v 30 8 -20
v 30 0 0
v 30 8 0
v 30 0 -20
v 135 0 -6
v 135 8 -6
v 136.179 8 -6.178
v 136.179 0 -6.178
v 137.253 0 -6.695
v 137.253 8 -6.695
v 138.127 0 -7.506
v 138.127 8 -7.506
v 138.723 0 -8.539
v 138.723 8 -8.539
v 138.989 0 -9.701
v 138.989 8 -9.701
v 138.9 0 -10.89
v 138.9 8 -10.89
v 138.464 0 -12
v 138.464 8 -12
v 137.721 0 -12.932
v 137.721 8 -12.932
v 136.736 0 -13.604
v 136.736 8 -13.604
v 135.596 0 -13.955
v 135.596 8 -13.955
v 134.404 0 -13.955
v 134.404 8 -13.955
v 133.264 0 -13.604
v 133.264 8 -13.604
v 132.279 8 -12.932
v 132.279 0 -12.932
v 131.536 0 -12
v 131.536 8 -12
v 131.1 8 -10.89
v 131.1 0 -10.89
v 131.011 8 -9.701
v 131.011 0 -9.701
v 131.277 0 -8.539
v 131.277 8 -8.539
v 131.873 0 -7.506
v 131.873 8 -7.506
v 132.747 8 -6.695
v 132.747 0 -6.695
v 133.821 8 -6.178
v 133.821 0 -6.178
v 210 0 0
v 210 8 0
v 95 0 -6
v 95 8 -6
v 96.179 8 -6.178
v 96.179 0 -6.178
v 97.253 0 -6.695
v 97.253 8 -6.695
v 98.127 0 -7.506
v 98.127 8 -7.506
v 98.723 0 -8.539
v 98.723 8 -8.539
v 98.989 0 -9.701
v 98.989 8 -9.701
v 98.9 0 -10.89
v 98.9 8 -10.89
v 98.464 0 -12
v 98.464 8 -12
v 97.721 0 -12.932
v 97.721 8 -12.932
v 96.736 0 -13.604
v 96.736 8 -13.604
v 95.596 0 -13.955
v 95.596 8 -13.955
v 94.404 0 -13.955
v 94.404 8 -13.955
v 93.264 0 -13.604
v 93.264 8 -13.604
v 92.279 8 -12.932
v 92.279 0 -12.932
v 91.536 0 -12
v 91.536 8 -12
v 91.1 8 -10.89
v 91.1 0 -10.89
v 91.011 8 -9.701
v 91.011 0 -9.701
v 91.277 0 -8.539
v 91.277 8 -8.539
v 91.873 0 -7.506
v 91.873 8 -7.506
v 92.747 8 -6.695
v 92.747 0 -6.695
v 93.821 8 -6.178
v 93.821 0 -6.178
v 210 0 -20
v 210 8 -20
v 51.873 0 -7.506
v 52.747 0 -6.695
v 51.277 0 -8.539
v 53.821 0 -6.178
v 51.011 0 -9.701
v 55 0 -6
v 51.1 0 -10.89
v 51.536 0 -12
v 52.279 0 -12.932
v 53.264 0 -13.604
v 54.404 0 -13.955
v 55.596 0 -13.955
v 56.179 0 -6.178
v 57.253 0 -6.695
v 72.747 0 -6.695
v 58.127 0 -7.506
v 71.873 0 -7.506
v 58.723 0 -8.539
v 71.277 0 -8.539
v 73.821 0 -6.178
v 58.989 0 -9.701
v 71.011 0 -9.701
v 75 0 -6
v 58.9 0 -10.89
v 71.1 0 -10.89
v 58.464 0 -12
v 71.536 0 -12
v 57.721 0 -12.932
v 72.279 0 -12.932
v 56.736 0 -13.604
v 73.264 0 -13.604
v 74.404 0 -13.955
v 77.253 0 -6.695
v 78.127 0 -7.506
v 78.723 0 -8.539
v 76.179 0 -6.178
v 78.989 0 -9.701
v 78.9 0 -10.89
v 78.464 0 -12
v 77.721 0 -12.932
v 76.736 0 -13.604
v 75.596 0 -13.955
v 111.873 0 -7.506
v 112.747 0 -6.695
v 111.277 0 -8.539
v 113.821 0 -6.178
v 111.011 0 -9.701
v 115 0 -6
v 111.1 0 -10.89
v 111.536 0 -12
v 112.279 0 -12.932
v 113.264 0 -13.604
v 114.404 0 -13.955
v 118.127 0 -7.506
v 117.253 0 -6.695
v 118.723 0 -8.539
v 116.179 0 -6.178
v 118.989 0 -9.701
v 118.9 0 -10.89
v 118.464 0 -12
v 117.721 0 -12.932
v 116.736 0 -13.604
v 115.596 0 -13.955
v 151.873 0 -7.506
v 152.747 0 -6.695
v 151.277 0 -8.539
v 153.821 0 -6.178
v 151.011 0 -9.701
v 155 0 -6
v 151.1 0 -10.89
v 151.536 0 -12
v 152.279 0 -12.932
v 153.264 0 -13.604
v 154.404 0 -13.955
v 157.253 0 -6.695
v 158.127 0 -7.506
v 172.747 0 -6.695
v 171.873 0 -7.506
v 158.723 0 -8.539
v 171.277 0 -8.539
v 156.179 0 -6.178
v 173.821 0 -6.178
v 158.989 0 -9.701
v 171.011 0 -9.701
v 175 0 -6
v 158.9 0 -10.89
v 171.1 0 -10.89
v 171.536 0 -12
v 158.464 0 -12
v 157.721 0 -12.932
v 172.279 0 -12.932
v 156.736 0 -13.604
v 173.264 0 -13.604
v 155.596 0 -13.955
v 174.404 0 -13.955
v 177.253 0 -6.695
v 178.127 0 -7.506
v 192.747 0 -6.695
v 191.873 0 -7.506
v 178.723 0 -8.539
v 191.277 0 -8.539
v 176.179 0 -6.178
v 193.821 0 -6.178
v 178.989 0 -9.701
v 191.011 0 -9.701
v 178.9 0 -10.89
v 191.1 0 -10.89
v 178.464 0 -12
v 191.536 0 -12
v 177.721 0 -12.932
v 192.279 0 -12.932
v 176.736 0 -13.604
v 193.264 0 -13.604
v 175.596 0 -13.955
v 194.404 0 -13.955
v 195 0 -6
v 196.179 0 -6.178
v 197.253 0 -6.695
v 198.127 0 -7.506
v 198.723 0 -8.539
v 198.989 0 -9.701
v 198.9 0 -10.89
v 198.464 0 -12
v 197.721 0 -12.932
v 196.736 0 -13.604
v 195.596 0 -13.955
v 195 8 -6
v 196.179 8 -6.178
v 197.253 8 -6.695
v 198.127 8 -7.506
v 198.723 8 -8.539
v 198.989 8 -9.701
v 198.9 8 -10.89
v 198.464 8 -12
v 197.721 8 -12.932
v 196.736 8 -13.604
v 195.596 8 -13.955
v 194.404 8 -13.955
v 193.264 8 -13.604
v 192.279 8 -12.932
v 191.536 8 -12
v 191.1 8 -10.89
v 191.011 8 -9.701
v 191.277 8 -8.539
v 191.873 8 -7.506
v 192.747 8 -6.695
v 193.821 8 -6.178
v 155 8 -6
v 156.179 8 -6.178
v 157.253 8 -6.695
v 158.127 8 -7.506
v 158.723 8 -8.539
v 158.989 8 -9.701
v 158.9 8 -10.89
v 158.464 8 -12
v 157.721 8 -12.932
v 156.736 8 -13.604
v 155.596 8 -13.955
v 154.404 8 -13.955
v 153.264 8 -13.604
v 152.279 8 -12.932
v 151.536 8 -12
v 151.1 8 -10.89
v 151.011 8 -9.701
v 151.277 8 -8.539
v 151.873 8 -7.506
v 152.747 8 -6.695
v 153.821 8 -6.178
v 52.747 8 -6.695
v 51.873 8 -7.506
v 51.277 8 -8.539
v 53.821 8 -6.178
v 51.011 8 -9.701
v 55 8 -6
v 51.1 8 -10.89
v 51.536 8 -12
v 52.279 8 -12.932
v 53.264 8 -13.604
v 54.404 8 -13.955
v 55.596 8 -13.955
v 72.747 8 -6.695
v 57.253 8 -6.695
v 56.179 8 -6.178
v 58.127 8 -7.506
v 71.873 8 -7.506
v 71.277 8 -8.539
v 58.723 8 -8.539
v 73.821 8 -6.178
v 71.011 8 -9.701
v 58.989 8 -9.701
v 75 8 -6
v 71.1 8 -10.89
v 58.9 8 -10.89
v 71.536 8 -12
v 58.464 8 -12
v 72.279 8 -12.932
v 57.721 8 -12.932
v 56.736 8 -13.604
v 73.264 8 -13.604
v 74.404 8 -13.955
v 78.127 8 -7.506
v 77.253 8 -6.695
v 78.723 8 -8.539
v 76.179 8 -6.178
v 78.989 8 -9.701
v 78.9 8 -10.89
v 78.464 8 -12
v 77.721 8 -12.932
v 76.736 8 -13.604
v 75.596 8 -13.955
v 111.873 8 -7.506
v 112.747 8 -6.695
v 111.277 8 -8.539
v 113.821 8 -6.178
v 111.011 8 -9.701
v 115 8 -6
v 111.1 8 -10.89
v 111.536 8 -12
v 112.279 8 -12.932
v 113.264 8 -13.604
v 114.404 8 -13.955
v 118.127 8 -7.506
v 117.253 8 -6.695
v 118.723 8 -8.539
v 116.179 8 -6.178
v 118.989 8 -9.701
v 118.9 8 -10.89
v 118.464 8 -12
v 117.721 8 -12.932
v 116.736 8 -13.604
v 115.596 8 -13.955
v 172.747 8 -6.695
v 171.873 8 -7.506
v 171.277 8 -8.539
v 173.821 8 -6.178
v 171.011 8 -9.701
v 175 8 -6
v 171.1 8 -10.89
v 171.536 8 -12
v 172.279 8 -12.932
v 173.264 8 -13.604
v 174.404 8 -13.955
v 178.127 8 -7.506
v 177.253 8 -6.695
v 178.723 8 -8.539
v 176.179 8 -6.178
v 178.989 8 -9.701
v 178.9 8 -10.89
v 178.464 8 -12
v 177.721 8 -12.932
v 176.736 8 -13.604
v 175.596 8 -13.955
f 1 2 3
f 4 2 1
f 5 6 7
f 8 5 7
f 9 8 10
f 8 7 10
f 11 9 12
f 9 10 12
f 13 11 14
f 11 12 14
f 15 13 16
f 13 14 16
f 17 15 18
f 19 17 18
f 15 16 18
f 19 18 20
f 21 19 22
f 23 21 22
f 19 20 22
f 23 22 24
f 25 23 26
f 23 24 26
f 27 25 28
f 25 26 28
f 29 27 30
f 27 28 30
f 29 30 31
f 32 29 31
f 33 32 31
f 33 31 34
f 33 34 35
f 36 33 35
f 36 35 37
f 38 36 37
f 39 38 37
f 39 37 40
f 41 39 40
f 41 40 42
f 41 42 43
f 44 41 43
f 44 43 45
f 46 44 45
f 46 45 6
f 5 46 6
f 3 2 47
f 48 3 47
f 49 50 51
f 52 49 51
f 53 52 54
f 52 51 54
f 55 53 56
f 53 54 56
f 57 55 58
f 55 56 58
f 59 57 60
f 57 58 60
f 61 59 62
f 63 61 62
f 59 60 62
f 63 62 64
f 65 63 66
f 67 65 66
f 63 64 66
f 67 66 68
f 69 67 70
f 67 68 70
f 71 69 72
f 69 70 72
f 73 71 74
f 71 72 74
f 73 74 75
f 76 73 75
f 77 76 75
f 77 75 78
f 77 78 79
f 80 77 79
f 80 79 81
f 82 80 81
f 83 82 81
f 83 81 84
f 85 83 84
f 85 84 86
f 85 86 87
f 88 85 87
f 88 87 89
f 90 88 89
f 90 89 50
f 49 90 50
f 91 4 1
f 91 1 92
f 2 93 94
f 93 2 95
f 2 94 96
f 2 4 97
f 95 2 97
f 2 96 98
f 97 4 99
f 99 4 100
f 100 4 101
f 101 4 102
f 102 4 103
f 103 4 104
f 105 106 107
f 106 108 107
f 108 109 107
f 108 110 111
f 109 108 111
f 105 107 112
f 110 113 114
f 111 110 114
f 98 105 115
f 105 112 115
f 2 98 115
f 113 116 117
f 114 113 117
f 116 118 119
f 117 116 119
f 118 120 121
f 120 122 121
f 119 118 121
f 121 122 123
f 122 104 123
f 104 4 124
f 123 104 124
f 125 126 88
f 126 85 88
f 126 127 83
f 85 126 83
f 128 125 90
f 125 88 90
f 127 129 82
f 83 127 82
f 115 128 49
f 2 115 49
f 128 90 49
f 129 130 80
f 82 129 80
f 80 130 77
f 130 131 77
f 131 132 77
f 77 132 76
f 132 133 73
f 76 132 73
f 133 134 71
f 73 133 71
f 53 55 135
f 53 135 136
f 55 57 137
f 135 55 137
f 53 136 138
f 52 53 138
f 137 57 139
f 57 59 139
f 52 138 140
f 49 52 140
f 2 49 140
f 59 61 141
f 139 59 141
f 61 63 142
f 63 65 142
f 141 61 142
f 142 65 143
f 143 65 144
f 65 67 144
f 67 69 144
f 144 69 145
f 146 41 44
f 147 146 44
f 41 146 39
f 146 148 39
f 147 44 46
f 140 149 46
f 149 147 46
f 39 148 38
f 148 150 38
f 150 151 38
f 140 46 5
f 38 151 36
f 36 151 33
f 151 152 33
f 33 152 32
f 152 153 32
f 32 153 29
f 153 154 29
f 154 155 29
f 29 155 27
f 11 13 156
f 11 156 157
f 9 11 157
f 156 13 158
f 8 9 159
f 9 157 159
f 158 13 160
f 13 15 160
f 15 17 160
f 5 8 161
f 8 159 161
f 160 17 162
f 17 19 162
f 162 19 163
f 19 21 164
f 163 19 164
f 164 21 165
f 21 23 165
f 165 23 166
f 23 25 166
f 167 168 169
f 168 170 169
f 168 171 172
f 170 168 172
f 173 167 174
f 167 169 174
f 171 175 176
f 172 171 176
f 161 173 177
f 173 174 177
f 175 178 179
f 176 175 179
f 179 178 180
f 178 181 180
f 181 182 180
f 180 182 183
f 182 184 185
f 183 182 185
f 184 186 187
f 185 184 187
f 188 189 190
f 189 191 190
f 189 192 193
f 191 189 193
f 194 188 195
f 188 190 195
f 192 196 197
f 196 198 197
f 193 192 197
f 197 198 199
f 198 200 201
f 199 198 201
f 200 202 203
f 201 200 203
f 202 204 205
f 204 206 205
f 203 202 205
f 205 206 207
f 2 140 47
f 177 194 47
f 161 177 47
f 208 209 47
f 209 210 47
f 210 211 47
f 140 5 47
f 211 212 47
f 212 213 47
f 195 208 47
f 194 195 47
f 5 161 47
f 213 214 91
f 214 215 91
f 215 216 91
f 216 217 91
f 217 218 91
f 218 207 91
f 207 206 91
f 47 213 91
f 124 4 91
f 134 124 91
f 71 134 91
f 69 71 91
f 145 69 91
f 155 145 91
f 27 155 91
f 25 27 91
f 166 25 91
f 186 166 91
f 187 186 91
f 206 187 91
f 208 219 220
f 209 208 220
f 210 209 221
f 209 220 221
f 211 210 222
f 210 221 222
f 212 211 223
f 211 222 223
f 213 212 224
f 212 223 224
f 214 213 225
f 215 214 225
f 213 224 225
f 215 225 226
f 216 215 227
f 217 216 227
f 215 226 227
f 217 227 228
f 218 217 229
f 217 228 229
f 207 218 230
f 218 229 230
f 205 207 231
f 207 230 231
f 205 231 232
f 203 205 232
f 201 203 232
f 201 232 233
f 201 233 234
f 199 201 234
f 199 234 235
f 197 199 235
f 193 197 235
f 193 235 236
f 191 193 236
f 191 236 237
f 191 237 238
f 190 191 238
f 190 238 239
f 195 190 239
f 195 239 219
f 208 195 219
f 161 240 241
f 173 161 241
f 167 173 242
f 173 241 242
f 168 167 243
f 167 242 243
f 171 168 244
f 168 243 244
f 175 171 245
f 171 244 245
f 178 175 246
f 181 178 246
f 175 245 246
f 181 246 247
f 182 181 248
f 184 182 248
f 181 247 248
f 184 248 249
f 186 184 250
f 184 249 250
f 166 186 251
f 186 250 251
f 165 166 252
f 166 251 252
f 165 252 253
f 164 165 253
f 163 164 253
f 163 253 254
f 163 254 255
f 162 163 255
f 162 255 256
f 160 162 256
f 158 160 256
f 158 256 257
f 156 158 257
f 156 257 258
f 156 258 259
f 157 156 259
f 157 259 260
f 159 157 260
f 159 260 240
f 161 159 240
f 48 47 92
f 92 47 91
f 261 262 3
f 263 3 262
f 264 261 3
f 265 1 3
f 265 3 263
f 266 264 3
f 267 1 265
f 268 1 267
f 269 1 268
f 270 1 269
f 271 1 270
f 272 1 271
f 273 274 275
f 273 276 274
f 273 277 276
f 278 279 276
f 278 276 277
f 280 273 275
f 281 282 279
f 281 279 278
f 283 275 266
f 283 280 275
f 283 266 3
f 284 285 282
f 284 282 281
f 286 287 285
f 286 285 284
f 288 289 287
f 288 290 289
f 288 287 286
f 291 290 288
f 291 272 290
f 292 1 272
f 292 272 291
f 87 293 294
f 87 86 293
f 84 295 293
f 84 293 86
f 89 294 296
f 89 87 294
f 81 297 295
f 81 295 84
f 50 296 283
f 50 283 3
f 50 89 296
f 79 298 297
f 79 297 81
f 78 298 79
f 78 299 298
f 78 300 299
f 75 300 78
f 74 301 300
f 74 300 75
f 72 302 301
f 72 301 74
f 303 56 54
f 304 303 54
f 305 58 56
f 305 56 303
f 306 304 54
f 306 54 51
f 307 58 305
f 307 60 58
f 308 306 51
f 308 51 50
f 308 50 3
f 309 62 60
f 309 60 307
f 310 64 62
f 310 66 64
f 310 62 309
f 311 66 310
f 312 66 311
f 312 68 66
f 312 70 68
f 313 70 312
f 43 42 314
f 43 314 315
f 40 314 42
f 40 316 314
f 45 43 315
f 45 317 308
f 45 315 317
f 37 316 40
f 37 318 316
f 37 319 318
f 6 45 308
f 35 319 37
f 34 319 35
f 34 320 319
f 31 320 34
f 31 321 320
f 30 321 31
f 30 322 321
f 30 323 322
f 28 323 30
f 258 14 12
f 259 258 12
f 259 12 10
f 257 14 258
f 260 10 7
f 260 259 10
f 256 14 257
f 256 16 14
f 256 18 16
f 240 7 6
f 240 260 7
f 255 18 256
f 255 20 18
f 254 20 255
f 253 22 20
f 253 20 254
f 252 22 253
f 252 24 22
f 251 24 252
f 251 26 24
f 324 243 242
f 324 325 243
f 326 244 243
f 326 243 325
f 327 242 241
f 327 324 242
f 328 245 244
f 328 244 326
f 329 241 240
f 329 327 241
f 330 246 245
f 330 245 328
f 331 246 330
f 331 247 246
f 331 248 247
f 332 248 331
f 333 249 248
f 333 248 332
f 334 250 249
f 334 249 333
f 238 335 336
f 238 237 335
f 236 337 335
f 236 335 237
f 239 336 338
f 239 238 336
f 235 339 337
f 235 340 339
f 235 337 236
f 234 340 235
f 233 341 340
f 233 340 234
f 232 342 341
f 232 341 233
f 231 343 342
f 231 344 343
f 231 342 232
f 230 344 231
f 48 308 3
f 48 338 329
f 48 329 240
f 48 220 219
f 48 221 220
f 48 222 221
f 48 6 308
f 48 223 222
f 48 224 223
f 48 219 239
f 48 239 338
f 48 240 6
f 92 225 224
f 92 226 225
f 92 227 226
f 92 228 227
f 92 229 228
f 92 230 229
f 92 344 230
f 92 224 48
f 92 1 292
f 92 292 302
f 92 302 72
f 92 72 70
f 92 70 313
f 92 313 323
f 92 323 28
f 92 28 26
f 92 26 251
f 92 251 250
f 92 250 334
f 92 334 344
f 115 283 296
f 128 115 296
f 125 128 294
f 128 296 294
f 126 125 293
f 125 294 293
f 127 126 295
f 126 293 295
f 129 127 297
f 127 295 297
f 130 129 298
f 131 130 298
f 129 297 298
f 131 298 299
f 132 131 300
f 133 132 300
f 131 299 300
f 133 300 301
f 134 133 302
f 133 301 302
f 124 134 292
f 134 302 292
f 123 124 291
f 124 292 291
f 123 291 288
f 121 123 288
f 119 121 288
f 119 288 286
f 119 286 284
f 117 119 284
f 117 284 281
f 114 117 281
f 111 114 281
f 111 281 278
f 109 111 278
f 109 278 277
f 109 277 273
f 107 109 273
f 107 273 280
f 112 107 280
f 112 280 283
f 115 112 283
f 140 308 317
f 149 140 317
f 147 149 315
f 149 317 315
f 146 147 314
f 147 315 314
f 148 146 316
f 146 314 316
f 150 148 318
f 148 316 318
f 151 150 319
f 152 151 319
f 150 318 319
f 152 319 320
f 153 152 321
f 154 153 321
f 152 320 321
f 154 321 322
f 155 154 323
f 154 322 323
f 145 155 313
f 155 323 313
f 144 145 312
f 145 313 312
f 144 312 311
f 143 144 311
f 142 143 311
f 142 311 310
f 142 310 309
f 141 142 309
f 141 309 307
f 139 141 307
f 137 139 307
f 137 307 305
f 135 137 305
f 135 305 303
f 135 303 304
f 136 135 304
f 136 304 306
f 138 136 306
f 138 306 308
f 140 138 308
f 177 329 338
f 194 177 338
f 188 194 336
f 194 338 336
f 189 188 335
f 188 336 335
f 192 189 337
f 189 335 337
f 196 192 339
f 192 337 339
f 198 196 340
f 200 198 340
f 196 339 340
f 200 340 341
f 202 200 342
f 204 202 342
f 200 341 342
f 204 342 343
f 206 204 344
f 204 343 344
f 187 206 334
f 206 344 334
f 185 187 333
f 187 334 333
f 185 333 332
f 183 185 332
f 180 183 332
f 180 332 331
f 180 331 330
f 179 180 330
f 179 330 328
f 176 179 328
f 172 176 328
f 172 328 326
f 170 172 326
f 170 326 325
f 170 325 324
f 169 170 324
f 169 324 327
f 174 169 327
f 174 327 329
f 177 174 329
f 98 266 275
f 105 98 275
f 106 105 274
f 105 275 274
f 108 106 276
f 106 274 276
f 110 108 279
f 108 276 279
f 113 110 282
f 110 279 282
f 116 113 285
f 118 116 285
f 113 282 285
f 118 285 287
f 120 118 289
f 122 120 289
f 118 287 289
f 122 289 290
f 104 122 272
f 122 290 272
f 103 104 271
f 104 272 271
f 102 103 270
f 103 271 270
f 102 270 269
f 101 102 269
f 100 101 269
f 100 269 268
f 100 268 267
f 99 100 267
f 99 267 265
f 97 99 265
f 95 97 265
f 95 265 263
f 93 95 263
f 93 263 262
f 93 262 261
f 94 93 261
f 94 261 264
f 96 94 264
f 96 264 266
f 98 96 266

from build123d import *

# Parameters (mm, degrees)
SKETCH1_W           = 210
SKETCH1_H           = 20
BOSS_EXTRUDE1_DEPTH = 8
SKETCH2_R           = 4
CUT_EXTRUDE1_DEPTH  = 10
LPATTERN1_COUNT     = 8
LPATTERN1_PITCH     = 20
SKETCH4_W           = 80
SKETCH4_H           = 20
CUT_EXTRUDE2_DEPTH  = 10


with BuildPart() as part:
    # Sketch1 → Boss-Extrude1 (new body)
    with BuildSketch(Plane(origin=(0, 0, 0), x_dir=(1, 0, 0), z_dir=(0, 1, 0))):
        with Locations((105, 10)):
            Rectangle(SKETCH1_W, SKETCH1_H)
    extrude(amount=BOSS_EXTRUDE1_DEPTH)

    # Sketch2 → Cut-Extrude1 (cut)
    with BuildSketch(Plane(origin=(0, 8, 0), x_dir=(1, 0, 0), z_dir=(0, 1, 0))):
        with Locations(Location((195, 10, 0), (0, 0, 270))):
            Circle(SKETCH2_R)
    cut_extrude1 = extrude(amount=-CUT_EXTRUDE1_DEPTH, mode=Mode.SUBTRACT)

    # LPattern1: Cut-Extrude1 ×8
    with Locations(*[(-i * LPATTERN1_PITCH, 0, 0) for i in range(1, LPATTERN1_COUNT)]):
        add(cut_extrude1, mode=Mode.SUBTRACT)

    # Sketch4 → Cut-Extrude2 (cut)
    with BuildSketch(Plane(origin=(0, 0, 0), x_dir=(1, 0, 0), z_dir=(0, 1, 0))):
        with Locations((-10, 10)):
            Rectangle(SKETCH4_W, SKETCH4_H)
    extrude(amount=CUT_EXTRUDE2_DEPTH, mode=Mode.SUBTRACT)


solid = part.part
